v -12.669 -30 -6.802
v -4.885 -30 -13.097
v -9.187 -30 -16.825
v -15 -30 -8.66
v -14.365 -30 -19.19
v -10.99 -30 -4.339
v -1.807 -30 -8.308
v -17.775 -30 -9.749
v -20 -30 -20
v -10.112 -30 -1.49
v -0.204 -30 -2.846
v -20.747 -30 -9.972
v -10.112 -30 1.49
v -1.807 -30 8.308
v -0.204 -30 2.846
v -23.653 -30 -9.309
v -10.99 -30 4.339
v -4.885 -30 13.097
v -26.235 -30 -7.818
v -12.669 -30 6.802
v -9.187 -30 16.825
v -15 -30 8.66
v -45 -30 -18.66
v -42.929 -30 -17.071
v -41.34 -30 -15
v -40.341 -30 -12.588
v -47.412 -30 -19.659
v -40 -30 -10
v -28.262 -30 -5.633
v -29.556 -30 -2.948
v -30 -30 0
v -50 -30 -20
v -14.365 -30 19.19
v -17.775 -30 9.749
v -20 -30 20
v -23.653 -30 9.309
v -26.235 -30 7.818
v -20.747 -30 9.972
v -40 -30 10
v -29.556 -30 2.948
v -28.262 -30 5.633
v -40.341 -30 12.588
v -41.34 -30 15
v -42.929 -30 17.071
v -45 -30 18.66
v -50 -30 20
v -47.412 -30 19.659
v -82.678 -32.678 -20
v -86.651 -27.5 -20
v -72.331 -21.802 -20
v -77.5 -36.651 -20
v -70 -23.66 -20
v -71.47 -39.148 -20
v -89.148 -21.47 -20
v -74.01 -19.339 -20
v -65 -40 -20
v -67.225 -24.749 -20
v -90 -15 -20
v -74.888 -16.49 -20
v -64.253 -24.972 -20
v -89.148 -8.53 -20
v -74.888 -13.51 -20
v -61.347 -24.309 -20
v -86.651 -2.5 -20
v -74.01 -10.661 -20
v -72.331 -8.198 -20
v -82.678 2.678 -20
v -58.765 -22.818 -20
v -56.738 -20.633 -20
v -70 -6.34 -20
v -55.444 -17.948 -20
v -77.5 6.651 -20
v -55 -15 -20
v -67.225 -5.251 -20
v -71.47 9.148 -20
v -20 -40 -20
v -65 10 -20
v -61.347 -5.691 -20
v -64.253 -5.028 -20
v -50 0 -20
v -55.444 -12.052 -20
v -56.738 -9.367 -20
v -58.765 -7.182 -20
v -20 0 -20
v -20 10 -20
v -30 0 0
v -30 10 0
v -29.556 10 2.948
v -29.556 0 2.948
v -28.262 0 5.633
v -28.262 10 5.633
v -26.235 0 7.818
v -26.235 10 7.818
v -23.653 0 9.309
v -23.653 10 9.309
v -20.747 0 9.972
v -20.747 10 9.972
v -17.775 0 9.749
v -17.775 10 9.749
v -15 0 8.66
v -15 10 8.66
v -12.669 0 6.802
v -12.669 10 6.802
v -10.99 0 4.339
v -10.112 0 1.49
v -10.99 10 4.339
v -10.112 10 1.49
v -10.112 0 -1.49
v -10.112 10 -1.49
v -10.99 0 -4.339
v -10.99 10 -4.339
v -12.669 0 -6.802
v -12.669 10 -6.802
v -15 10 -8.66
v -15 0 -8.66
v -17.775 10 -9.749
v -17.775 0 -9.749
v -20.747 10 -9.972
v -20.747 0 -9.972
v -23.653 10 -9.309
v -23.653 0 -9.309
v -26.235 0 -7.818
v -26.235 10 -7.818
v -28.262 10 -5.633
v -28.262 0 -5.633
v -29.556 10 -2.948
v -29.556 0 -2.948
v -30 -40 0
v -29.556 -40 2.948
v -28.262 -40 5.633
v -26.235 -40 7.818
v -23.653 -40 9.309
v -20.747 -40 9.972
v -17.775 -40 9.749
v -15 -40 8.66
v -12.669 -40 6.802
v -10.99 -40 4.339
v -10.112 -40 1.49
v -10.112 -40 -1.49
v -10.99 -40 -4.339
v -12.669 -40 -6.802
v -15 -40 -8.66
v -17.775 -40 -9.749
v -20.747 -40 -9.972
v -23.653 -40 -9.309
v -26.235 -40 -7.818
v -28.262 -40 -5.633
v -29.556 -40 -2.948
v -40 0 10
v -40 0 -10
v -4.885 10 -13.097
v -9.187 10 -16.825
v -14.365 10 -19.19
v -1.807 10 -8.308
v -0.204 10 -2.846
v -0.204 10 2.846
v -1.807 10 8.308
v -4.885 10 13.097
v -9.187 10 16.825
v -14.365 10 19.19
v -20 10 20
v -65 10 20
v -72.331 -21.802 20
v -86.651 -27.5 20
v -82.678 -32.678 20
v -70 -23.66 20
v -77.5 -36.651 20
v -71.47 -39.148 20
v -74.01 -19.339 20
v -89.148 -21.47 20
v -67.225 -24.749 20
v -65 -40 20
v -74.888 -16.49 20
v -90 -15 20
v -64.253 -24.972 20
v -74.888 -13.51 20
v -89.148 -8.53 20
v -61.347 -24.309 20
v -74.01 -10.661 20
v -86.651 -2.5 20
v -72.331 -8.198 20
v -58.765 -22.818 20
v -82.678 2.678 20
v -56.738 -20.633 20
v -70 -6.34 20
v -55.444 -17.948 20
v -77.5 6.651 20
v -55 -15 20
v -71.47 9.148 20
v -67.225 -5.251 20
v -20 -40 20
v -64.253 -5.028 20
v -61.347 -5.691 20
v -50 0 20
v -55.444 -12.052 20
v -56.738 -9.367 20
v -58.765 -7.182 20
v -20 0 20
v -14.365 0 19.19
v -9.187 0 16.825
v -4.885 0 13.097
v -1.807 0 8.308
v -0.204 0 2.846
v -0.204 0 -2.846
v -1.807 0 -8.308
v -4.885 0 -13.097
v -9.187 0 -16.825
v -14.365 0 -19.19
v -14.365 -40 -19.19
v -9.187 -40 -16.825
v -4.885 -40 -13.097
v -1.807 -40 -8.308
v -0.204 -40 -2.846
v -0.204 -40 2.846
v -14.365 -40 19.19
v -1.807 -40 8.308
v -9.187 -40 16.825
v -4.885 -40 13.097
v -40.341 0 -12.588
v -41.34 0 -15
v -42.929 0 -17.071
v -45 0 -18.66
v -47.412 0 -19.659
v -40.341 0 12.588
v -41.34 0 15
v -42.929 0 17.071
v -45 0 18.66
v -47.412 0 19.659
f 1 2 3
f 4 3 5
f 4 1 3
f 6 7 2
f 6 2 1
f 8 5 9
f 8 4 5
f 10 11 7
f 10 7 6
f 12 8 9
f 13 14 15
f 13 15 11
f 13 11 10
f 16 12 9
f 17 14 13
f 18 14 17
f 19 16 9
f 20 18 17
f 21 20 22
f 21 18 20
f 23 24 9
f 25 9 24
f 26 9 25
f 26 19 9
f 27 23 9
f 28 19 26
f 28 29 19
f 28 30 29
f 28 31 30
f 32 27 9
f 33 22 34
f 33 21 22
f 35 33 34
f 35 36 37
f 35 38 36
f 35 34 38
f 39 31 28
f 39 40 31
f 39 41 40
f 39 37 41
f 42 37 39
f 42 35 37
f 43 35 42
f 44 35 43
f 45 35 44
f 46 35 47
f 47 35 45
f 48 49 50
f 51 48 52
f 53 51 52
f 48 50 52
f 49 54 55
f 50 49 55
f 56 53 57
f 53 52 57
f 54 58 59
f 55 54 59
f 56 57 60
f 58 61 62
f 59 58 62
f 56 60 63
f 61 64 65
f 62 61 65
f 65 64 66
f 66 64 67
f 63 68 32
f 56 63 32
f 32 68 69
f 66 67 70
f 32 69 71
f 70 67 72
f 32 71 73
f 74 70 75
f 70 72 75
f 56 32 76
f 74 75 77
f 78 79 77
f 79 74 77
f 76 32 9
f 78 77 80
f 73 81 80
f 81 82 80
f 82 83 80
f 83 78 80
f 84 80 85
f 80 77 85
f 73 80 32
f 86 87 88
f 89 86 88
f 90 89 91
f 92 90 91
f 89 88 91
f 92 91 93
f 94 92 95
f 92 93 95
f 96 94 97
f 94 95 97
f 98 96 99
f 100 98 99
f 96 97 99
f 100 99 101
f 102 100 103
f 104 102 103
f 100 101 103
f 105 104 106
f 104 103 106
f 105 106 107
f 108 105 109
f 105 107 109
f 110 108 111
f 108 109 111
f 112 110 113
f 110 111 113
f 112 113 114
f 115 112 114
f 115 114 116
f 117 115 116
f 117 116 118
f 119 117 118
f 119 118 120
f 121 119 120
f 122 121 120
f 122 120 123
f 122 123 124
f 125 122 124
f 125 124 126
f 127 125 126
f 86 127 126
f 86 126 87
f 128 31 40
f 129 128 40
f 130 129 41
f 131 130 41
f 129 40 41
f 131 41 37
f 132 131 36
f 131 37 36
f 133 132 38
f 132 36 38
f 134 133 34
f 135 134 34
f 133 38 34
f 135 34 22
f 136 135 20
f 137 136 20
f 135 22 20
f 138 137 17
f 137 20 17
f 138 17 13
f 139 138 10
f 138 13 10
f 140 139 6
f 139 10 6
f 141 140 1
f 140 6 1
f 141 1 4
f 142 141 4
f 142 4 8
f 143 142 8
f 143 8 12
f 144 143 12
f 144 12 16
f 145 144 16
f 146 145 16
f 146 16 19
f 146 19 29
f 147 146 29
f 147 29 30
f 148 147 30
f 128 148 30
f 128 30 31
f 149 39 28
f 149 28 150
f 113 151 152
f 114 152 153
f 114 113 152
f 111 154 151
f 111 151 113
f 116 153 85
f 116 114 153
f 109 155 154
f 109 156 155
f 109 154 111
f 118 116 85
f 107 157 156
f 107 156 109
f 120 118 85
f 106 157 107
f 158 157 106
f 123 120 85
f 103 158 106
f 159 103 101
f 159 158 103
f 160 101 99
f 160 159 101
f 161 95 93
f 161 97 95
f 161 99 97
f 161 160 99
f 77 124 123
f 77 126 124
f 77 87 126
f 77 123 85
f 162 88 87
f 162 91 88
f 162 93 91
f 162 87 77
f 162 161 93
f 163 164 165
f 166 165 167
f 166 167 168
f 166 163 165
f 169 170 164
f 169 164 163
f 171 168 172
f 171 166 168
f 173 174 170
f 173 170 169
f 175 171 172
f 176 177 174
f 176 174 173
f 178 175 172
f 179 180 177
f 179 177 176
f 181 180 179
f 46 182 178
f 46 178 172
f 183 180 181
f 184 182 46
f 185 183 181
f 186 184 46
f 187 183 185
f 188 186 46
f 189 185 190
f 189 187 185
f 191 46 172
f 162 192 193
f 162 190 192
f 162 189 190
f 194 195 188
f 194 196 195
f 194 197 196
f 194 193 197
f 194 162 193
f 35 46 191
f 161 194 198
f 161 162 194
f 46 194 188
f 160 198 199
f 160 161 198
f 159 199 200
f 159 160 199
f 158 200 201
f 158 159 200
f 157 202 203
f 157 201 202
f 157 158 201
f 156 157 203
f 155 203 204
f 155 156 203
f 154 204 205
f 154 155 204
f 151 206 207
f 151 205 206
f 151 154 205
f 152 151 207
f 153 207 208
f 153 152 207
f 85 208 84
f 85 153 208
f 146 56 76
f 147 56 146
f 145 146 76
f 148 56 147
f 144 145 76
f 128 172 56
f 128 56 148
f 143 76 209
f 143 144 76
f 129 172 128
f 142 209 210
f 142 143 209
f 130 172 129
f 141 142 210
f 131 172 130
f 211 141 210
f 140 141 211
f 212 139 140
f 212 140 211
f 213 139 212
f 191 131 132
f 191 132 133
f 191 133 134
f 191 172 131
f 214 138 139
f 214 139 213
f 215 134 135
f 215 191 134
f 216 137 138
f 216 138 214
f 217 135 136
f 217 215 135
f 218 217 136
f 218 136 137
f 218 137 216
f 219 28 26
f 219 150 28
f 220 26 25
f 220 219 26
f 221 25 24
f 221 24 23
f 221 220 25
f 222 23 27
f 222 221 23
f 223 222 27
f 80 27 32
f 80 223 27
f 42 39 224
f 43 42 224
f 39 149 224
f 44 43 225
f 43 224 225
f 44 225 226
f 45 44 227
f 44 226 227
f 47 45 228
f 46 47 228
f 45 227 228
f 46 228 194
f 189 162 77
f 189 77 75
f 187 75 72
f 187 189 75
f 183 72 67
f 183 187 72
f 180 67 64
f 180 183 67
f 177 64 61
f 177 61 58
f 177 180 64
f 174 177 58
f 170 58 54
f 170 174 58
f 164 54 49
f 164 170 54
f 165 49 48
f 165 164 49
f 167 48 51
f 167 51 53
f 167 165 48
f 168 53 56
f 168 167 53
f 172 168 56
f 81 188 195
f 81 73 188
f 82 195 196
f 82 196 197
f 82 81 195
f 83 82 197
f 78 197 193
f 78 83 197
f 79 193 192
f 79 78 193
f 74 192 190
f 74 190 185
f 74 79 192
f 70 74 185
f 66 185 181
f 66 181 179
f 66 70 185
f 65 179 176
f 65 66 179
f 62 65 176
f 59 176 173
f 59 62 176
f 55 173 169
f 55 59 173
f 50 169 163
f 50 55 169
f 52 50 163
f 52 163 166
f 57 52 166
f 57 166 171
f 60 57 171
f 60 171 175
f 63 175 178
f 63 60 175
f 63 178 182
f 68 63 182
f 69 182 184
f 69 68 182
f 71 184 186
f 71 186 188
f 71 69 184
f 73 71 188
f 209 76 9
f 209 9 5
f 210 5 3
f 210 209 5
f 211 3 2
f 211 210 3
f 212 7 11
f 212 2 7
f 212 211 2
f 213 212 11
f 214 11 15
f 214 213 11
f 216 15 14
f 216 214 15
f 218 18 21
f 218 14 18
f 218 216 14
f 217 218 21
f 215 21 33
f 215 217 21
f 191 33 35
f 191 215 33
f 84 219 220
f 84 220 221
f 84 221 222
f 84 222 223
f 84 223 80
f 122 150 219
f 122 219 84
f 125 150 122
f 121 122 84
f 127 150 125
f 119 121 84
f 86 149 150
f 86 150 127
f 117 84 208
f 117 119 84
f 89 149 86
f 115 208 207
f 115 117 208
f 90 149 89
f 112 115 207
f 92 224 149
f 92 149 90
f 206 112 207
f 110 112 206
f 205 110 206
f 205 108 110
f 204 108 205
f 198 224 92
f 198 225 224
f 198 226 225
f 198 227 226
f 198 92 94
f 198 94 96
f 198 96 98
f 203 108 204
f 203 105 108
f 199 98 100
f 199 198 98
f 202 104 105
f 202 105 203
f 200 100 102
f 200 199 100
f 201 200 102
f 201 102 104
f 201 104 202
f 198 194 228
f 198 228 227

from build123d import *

# Parameters (mm, degrees)
SKETCH1_R           = 10
BOSS_EXTRUDE1_DEPTH = 20
FILLET1_R           = 10
CUT_EXTRUDE1_REACH  = 106.881
SKETCH2_R           = 10
CUT_EXTRUDE2_REACH  = 106.881
SKETCH2_2_R         = 10
FILLET2_RADIUS      = 20
FILLET2_LENGTH      = 10
FILLET3_RADIUS      = 20
FILLET3_LENGTH      = 10


with BuildPart() as part:
    # Sketch1 → Boss-Extrude1 (new, symmetric)
    with BuildSketch(Plane.XY):
        with BuildLine():
            Line((0, 0), (0, 10))
            Line((0, 10), (-65, 10))
            ThreePointArc((-65, 10), (-90, -15), (-65, -40))
            Line((-65, -40), (0, -40))
            Line((0, -40), (0, -30))
            Line((0, -30), (-40, -30))
            Line((-40, -30), (-40, 0))
            Line((-40, 0), (0, 0))
        make_face()
        with Locations((-65, -15)):
            Circle(SKETCH1_R, mode=Mode.SUBTRACT)
    extrude(amount=BOSS_EXTRUDE1_DEPTH, both=True)

    # Fillet1
    fillet1_edges = [part.edges().sort_by_distance(p)[0] for p in [
        (-40, -15, -20),
        (-40, -15, 20),
    ]]
    fillet(fillet1_edges, radius=FILLET1_R)

    # Sketch2 → Cut-Extrude1 (cut, up to next)
    with BuildSketch(Plane(origin=(0, 10, 0), x_dir=(1, 0, 0), z_dir=(0, 1, 0)), mode=Mode.PRIVATE) as cut_extrude1_sk1:
        with Locations(Location((-20, 0, 0), (0, 0, 180))):
            Circle(SKETCH2_R)
    cut_extrude1_tool1 = extrude(cut_extrude1_sk1.sketch, amount=-CUT_EXTRUDE1_REACH, mode=Mode.PRIVATE) & part.part
    add(cut_extrude1_tool1.solids().sort_by_distance((-20, 10, 0))[0], mode=Mode.SUBTRACT)

    # Sketch2<2> → Cut-Extrude2 (cut, up to next)
    with BuildSketch(Plane(origin=(0, 10, 0), x_dir=(1, 0, 0), z_dir=(0, 1, 0)), mode=Mode.PRIVATE) as cut_extrude2_sk1:
        with Locations(Location((-20, 0, 0), (0, 0, 180))):
            Circle(SKETCH2_2_R)
    cut_extrude2_tool1 = extrude(cut_extrude2_sk1.sketch, amount=-CUT_EXTRUDE2_REACH, mode=Mode.PRIVATE) & part.part
    add(cut_extrude2_tool1.solids().sort_by_distance((-20, 10, 0))[0], mode=Mode.SUBTRACT)

    # Fillet2: full round fillet: the end face becomes a half cylinder, R = half its width
    fillet2_face = Plane((0, -35, 0), x_dir=(0, -1, 0), z_dir=(1, 0, 0))  # on the end face: x along it, z out of the body
    fillet2_slab = fillet2_face.offset(-FILLET2_RADIUS / 2) * Box(FILLET2_LENGTH, 2 * FILLET2_RADIUS, FILLET2_RADIUS, mode=Mode.PRIVATE)  # the body's end, R deep
    fillet2_round = Plane((-20, -35, 0), x_dir=(1, 0, 0), z_dir=(0, -1, 0)) * Cylinder(FILLET2_RADIUS, FILLET2_LENGTH, mode=Mode.PRIVATE)  # its axis R under the face
    add(fillet2_slab - fillet2_round, mode=Mode.SUBTRACT)

    # Fillet3: full round fillet: the end face becomes a half cylinder, R = half its width
    fillet3_face = Plane((0, 5, 0), x_dir=(0, 1, 0), z_dir=(1, 0, 0))  # on the end face: x along it, z out of the body
    fillet3_slab = fillet3_face.offset(-FILLET3_RADIUS / 2) * Box(FILLET3_LENGTH, 2 * FILLET3_RADIUS, FILLET3_RADIUS, mode=Mode.PRIVATE)  # the body's end, R deep
    fillet3_round = Plane((-20, 5, 0), x_dir=(1, 0, 0), z_dir=(0, 1, 0)) * Cylinder(FILLET3_RADIUS, FILLET3_LENGTH, mode=Mode.PRIVATE)  # its axis R under the face
    add(fillet3_slab - fillet3_round, mode=Mode.SUBTRACT)


solid = part.part
